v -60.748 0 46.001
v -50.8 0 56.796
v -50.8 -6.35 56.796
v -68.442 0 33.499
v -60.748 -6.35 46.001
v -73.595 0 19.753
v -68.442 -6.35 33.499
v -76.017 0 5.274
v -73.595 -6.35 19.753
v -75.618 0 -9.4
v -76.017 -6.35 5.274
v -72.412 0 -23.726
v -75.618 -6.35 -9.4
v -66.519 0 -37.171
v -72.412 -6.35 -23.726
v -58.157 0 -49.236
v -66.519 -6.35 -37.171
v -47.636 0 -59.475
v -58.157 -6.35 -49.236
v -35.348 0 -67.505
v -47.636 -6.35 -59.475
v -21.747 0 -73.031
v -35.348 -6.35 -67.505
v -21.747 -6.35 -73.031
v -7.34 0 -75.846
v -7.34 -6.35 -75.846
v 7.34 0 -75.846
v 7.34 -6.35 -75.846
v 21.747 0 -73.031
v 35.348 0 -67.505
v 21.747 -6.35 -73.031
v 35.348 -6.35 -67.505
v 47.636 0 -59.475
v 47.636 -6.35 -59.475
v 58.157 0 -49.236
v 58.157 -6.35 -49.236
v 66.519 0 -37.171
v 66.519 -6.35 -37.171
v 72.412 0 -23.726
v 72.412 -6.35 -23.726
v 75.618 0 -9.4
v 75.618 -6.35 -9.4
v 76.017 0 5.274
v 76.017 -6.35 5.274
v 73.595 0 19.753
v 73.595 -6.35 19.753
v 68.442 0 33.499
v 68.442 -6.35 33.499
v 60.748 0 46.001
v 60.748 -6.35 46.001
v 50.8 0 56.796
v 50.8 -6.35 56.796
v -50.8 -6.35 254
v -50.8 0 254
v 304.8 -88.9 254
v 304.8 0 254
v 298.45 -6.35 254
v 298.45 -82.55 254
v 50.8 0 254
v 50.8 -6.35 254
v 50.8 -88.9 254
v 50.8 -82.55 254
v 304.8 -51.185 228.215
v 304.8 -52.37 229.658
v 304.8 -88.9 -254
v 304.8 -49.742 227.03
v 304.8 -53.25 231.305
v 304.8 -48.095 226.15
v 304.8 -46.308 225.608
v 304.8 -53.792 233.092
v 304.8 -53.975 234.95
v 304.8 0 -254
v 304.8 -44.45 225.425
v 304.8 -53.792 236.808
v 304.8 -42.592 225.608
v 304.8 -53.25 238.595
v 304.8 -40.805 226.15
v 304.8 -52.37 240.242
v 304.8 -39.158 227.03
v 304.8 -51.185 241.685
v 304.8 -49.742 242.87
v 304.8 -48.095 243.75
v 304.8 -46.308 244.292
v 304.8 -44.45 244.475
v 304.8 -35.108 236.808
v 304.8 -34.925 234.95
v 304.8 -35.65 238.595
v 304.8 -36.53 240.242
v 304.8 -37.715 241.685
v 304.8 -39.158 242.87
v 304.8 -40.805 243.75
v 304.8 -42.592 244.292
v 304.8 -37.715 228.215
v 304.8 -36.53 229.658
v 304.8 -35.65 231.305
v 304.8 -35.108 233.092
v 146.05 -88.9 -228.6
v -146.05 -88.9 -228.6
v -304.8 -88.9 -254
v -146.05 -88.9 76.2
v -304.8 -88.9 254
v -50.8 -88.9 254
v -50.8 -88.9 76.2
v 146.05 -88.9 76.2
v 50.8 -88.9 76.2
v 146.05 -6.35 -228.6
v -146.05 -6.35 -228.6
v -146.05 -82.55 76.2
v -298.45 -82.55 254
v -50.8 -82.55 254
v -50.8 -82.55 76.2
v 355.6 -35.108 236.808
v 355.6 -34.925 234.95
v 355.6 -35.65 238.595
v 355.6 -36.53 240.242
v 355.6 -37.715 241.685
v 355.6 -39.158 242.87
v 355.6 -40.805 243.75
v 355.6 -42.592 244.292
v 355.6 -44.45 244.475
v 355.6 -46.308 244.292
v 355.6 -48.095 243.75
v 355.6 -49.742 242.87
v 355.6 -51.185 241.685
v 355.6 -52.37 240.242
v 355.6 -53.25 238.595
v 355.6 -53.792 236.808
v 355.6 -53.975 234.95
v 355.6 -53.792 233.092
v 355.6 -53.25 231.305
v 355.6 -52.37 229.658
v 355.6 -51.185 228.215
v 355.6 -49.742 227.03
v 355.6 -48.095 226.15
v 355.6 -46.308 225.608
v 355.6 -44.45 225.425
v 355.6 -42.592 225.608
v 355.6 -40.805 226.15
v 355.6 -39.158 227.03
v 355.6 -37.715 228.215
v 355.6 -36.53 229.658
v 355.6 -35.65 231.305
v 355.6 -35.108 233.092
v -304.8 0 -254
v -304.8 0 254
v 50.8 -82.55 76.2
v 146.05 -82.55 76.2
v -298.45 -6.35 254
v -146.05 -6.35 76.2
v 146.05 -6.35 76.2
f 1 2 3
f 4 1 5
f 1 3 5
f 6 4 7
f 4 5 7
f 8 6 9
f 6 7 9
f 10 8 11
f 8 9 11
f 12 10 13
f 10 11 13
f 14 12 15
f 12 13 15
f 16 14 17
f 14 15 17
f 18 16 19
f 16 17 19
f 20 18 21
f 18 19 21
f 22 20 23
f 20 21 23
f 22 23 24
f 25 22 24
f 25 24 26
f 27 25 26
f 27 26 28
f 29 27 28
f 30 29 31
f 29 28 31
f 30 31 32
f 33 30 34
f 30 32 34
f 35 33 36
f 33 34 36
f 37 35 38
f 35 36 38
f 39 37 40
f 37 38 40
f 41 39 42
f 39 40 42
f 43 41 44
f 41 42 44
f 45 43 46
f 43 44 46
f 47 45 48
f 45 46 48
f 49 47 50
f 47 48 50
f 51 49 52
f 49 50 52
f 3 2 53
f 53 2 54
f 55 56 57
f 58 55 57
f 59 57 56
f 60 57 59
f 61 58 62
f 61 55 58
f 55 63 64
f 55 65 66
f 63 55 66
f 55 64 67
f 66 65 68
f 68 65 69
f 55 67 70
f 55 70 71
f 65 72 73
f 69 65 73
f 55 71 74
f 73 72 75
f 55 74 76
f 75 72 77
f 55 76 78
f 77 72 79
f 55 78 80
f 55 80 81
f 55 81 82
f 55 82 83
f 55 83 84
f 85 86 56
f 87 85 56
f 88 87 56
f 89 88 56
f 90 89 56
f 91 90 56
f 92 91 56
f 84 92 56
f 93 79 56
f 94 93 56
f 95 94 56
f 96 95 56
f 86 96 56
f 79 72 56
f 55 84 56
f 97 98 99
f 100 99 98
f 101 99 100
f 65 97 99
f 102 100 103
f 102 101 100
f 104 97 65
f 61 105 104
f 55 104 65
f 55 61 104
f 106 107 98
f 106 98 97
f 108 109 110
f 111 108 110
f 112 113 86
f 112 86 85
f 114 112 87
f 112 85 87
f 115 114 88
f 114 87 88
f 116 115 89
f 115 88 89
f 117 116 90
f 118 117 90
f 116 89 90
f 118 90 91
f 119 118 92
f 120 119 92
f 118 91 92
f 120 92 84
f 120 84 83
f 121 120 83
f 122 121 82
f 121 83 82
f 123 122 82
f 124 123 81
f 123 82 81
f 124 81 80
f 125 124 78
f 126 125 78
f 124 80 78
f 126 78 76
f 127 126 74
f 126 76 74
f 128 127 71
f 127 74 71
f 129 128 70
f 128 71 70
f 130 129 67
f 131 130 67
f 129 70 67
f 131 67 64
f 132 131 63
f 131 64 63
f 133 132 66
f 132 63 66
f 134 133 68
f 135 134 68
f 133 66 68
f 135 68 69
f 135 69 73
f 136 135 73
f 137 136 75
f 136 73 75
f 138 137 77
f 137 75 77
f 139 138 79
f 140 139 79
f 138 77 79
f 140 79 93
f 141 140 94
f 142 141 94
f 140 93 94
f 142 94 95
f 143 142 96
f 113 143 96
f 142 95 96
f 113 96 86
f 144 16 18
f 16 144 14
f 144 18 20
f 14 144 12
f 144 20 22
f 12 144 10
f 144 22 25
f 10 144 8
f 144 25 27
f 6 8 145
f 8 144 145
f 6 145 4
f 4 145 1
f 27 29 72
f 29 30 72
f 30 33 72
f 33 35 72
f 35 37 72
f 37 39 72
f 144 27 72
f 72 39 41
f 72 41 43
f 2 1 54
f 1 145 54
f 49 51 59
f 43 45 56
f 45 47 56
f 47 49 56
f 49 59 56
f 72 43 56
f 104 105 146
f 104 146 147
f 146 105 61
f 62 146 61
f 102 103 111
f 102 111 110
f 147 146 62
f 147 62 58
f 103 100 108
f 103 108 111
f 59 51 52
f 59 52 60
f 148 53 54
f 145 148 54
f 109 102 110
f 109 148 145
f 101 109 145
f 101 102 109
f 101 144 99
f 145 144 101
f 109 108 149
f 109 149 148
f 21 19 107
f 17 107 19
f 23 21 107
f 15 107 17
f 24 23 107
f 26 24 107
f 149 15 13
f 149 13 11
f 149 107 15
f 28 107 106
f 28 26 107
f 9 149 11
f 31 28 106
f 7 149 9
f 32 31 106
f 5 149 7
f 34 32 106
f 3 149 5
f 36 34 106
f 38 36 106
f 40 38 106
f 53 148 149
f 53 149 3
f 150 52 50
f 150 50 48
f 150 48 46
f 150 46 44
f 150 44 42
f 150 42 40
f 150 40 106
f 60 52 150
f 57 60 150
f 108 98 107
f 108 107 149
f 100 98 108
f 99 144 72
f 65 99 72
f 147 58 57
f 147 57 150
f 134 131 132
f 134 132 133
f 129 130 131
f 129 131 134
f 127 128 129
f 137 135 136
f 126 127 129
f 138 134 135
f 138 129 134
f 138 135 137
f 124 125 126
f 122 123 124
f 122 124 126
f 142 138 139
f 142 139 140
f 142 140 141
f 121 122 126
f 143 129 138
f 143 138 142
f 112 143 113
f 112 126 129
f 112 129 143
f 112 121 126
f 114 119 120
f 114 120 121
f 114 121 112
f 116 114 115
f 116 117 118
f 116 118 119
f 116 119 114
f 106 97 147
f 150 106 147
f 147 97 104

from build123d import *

# Parameters (mm, degrees)
F0_W      = 609.6
F0_H      = 508
F1_DEPTH  = 88.9
F2_W      = 596.9
F2_H      = 82.55
F3_DEPTH  = 482.6
F4_R      = 9.525
F5_DEPTH  = 50.8
F7_DEPTH  = 82.55
F8_W      = 152.4
F8_H      = 304.8
F9_DEPTH  = 82.55
F11_DEPTH = 6.35
F12_R     = 76.2
F13_DEPTH = 25.4
F14_W     = 101.6
F14_H     = 177.8
F15_DEPTH = 25.4
F16_W     = 101.6
F16_H     = 199.39
F17_DEPTH = 25.4


with BuildPart() as f1:
    # F0 (on Front) → F1 (new body)
    with BuildSketch(Plane.XZ):
        Rectangle(F0_W, F0_H)
    extrude(amount=F1_DEPTH)

    # F2 (on face) → F3 (cut)
    with BuildSketch(Plane.XY.offset(254)):
        with Locations((0, -47.625)):
            Rectangle(F2_W, F2_H)
    extrude(amount=-F3_DEPTH, mode=Mode.SUBTRACT)

    # F4 (on face) → F5 (join)
    with BuildSketch(Plane.YZ.offset(304.8)):
        with Locations((-44.45, 234.95)):
            Circle(F4_R)
    extrude(amount=F5_DEPTH)

    # F6 (on face) → F7 (join, through all)
    with BuildSketch(Plane.XZ.offset(88.9)):
        Polygon((-298.45, 254), (-298.45, 76.2), (-146.05, 76.2), align=None)
        Polygon((298.45, 254), (146.05, 76.2), (298.45, 76.2), align=None)
    extrude(amount=-F7_DEPTH)

    # F8 (on face) → F9 (join, through all)
    with BuildSketch(Plane.XZ.offset(88.9)):
        with Locations((-222.25, -76.2)):
            Rectangle(F8_W, F8_H)
        with Locations((222.25, -76.2)):
            Rectangle(F8_W, F8_H)
    extrude(amount=-F9_DEPTH)

    # F10 (on face) → F11 (join)
    with BuildSketch(Plane.XZ.offset(88.9)):
        Polygon((298.45, 254), (-298.45, 254), (-146.05, 76.2), (146.05, 76.2), align=None)
    extrude(amount=-F11_DEPTH)

    # F12 (on face) → F13 (cut)
    with BuildSketch(Plane.XZ.offset(6.35)):
        Circle(F12_R)
    extrude(amount=-F13_DEPTH, mode=Mode.SUBTRACT)

    # F14 (on face) → F15 (cut)
    with BuildSketch(Plane.XZ.offset(88.9)):
        with Locations((0, 165.1)):
            Rectangle(F14_W, F14_H)
    extrude(amount=-F15_DEPTH, mode=Mode.SUBTRACT)

    # F16 (on face) → F17 (cut)
    with BuildSketch(Plane.XZ):
        with Locations((0, 154.305)):
            Rectangle(F16_W, F16_H)
    extrude(amount=F17_DEPTH, mode=Mode.SUBTRACT)


solid = f1.part
